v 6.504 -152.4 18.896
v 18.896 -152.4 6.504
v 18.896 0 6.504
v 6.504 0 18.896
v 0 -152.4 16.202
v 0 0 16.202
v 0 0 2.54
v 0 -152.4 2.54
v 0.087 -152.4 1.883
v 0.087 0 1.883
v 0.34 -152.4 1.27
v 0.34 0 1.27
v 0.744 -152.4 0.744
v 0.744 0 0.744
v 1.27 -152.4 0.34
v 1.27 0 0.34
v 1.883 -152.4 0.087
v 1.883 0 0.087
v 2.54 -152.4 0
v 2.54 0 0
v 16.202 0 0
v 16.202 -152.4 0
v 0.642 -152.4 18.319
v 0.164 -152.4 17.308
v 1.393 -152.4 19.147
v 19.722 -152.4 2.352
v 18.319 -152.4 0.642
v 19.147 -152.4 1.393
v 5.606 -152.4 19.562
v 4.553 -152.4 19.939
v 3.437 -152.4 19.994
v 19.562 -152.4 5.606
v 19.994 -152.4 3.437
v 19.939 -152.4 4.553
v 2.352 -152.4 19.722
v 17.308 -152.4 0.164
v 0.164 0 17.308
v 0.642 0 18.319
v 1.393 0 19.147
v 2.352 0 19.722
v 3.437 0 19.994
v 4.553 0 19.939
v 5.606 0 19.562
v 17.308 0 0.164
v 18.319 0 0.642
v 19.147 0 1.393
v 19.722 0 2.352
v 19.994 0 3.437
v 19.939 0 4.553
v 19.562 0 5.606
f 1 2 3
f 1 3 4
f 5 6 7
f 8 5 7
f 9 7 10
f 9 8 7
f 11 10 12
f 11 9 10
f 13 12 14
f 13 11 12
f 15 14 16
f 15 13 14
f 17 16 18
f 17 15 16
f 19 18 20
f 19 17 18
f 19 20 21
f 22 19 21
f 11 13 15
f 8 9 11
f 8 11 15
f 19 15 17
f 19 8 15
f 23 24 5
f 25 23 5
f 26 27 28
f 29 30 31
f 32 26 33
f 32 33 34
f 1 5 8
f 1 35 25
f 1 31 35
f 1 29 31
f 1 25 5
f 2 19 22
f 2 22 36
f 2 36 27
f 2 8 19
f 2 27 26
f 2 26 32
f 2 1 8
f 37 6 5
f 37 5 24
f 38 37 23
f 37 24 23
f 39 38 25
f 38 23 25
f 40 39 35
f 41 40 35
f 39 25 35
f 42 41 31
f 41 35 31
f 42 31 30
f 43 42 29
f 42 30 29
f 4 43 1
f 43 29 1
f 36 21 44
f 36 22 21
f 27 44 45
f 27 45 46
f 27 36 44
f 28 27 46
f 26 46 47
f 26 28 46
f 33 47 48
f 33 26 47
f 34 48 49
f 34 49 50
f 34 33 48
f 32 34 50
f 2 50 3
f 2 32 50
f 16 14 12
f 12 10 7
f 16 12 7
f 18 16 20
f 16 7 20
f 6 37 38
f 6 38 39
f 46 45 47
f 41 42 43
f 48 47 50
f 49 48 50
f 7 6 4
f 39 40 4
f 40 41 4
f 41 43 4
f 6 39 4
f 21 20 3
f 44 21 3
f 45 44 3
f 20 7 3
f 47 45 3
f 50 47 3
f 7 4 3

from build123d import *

# Parameters (mm, degrees)
F1_DEPTH = 152.4
F2_R     = 3.81
F3_R     = 2.54


with BuildPart() as f1:
    # F0 (on Front) → F1 (new body)
    with BuildSketch(Plane.XZ):
        Polygon((0, 25.4), (0, 0), (25.4, 0), align=None)
    extrude(amount=F1_DEPTH)

    # F2
    f2_edges = [f1.edges().sort_by_distance(p)[0] for p in [
        (0, -76.2, 25.4),
        (25.4, -76.2, 0),
    ]]
    fillet(f2_edges, radius=F2_R)

    # F3
    f3_edges = [f1.edges().sort_by_distance(p)[0] for p in [
        (0, -76.2, 0),
    ]]
    fillet(f3_edges, radius=F3_R)


solid = f1.part
